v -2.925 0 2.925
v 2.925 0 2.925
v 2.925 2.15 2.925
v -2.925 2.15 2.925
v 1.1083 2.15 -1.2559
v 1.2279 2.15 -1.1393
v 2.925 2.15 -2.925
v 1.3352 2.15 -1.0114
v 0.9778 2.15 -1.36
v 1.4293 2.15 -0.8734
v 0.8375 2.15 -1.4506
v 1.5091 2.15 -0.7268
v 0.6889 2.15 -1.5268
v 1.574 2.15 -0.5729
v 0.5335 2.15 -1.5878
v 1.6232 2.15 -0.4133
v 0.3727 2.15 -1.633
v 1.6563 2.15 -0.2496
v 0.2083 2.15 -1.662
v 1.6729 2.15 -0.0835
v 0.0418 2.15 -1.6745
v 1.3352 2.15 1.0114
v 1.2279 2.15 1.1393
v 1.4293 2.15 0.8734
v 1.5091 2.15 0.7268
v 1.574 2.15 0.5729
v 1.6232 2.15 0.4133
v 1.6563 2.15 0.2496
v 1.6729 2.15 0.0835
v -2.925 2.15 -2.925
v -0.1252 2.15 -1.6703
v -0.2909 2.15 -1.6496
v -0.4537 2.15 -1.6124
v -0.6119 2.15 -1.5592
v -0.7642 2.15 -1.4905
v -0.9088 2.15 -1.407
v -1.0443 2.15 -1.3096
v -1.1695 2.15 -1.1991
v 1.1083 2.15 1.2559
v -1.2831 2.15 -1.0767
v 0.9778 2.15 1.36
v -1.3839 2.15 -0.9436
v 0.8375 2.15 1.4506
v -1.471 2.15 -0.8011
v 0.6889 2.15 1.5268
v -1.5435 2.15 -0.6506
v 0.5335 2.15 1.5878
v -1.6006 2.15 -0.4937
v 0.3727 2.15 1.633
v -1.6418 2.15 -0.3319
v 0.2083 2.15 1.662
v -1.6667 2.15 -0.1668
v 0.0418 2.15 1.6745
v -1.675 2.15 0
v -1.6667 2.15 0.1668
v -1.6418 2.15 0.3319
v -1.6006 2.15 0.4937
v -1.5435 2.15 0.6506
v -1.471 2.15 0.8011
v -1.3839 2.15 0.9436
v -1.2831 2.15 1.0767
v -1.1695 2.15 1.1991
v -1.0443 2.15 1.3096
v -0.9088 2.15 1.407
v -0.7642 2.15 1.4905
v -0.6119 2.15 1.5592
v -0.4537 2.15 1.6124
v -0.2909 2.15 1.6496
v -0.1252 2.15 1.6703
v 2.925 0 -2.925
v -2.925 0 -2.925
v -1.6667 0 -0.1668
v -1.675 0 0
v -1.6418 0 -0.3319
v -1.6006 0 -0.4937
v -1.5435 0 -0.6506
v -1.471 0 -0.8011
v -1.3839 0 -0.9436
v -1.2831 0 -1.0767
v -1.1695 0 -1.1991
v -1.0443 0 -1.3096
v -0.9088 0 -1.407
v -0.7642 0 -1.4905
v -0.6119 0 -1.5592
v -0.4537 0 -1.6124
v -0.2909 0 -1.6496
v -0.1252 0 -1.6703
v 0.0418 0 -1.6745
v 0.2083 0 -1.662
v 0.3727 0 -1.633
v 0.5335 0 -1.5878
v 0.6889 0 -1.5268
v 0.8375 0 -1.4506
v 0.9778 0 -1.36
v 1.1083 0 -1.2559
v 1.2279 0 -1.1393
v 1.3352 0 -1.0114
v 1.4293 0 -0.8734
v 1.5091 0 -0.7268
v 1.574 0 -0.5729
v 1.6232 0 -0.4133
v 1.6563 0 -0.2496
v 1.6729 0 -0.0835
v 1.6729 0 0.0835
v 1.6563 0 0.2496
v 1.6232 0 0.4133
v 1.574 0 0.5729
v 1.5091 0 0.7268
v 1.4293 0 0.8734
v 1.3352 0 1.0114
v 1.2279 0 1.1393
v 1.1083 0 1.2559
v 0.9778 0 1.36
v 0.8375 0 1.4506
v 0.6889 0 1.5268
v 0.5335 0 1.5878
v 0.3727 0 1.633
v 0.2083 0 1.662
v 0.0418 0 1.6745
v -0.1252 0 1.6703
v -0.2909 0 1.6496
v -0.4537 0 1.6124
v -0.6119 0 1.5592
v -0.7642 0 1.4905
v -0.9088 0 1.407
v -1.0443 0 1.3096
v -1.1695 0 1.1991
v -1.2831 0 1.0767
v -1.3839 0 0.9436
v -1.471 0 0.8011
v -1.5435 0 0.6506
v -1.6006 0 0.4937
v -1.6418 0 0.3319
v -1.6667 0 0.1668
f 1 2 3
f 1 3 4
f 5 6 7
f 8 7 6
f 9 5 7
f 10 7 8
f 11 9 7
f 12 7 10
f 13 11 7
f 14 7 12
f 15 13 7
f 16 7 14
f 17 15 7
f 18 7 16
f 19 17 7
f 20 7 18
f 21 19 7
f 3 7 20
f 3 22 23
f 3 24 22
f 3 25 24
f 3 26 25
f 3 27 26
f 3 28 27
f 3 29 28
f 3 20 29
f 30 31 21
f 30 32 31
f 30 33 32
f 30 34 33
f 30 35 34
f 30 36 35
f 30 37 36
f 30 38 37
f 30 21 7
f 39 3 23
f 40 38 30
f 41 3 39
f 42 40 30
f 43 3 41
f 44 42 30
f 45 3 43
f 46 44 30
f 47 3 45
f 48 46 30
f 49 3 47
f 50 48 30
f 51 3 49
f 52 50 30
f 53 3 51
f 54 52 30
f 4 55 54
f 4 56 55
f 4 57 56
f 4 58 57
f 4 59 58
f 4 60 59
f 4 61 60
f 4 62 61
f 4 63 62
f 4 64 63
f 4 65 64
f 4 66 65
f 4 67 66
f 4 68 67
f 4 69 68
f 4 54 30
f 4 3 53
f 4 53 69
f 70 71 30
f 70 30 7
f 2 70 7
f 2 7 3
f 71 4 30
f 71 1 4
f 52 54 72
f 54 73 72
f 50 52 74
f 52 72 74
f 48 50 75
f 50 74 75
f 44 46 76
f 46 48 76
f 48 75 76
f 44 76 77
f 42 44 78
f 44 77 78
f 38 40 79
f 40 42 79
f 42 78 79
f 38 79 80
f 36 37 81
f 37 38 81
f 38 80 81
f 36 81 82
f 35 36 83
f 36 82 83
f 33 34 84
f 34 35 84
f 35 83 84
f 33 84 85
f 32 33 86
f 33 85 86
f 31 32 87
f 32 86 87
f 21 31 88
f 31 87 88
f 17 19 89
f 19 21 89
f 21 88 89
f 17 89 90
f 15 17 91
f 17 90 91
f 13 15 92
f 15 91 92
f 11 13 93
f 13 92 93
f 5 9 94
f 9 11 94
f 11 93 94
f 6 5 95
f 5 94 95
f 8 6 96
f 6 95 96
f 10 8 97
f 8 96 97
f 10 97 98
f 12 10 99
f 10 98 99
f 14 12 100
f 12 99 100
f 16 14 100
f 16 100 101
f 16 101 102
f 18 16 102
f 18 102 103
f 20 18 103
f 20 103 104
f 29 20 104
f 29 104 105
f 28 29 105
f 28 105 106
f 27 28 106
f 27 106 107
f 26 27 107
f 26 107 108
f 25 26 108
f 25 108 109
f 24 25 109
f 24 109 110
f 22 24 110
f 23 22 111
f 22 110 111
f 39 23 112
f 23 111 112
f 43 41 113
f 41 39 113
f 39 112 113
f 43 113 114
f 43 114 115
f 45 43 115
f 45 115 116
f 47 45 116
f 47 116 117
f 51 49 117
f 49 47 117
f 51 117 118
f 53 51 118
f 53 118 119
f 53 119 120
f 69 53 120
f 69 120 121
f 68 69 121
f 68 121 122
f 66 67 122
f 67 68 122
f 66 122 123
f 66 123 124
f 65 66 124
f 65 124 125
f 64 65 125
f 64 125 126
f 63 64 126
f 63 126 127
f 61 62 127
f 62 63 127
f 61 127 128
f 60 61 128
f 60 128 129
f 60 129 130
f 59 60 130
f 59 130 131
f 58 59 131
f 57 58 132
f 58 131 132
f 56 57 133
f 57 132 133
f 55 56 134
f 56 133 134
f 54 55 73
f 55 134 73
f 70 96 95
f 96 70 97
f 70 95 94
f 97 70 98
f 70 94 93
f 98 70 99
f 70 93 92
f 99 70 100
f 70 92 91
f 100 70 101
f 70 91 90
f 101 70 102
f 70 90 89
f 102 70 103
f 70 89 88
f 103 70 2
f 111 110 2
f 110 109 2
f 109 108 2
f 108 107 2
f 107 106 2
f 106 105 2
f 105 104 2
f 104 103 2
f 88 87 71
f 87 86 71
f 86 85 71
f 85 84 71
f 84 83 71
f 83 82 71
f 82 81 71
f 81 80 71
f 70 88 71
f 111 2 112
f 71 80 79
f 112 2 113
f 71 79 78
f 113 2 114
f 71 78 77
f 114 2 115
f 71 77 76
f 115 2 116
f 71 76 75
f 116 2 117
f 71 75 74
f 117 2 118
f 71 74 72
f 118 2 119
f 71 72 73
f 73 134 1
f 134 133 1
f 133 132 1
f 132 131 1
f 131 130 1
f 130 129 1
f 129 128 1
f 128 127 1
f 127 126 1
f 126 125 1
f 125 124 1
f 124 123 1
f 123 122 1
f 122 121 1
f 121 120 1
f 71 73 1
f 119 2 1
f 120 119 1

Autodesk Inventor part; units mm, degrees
ref_plane "YZ Plane" through (0, 0, 0) normal (1, 0, 0) x (0, 1, 0)
ref_plane "XZ Plane" through (0, 0, 0) normal (0, 1, 0) x (-1, 0, 0)
ref_plane "XY Plane" through (0, 0, 0) normal (0, 0, 1) x (1, 0, 0)
sketch "Sketch1" plane through (0, 0, 0) normal (0, 1, 0) x (-1, 0, 0)
  line L0 (-2.925, 2.925) -> (2.925, 2.925)
  line L1 (2.925, 2.925) -> (2.925, -2.925)
  line L2 (2.925, -2.925) -> (-2.925, -2.925)
  line L3 (-2.925, -2.925) -> (-2.925, 2.925)
  circle A0 centre (0, 0) radius 1.675
  point P0 (0, 2.925)
  point P1 (2.925, 0)
  dimension "d0" = 5.85
  dimension "d1" = 3.35
extrude "Extrusion1" add sketch "Sketch1" along normal blind 2.15
equation "\"d0\" = nut_A"
equation "\"d1\" = nut_C"
equation "\"d2\" = nut_B"
equation "\"nut_A\" = 5.85"
equation "\"nut_C\" = 3.35"
equation "\"nut_B\" = 2.15"
properties part number "NUT_3MM"
